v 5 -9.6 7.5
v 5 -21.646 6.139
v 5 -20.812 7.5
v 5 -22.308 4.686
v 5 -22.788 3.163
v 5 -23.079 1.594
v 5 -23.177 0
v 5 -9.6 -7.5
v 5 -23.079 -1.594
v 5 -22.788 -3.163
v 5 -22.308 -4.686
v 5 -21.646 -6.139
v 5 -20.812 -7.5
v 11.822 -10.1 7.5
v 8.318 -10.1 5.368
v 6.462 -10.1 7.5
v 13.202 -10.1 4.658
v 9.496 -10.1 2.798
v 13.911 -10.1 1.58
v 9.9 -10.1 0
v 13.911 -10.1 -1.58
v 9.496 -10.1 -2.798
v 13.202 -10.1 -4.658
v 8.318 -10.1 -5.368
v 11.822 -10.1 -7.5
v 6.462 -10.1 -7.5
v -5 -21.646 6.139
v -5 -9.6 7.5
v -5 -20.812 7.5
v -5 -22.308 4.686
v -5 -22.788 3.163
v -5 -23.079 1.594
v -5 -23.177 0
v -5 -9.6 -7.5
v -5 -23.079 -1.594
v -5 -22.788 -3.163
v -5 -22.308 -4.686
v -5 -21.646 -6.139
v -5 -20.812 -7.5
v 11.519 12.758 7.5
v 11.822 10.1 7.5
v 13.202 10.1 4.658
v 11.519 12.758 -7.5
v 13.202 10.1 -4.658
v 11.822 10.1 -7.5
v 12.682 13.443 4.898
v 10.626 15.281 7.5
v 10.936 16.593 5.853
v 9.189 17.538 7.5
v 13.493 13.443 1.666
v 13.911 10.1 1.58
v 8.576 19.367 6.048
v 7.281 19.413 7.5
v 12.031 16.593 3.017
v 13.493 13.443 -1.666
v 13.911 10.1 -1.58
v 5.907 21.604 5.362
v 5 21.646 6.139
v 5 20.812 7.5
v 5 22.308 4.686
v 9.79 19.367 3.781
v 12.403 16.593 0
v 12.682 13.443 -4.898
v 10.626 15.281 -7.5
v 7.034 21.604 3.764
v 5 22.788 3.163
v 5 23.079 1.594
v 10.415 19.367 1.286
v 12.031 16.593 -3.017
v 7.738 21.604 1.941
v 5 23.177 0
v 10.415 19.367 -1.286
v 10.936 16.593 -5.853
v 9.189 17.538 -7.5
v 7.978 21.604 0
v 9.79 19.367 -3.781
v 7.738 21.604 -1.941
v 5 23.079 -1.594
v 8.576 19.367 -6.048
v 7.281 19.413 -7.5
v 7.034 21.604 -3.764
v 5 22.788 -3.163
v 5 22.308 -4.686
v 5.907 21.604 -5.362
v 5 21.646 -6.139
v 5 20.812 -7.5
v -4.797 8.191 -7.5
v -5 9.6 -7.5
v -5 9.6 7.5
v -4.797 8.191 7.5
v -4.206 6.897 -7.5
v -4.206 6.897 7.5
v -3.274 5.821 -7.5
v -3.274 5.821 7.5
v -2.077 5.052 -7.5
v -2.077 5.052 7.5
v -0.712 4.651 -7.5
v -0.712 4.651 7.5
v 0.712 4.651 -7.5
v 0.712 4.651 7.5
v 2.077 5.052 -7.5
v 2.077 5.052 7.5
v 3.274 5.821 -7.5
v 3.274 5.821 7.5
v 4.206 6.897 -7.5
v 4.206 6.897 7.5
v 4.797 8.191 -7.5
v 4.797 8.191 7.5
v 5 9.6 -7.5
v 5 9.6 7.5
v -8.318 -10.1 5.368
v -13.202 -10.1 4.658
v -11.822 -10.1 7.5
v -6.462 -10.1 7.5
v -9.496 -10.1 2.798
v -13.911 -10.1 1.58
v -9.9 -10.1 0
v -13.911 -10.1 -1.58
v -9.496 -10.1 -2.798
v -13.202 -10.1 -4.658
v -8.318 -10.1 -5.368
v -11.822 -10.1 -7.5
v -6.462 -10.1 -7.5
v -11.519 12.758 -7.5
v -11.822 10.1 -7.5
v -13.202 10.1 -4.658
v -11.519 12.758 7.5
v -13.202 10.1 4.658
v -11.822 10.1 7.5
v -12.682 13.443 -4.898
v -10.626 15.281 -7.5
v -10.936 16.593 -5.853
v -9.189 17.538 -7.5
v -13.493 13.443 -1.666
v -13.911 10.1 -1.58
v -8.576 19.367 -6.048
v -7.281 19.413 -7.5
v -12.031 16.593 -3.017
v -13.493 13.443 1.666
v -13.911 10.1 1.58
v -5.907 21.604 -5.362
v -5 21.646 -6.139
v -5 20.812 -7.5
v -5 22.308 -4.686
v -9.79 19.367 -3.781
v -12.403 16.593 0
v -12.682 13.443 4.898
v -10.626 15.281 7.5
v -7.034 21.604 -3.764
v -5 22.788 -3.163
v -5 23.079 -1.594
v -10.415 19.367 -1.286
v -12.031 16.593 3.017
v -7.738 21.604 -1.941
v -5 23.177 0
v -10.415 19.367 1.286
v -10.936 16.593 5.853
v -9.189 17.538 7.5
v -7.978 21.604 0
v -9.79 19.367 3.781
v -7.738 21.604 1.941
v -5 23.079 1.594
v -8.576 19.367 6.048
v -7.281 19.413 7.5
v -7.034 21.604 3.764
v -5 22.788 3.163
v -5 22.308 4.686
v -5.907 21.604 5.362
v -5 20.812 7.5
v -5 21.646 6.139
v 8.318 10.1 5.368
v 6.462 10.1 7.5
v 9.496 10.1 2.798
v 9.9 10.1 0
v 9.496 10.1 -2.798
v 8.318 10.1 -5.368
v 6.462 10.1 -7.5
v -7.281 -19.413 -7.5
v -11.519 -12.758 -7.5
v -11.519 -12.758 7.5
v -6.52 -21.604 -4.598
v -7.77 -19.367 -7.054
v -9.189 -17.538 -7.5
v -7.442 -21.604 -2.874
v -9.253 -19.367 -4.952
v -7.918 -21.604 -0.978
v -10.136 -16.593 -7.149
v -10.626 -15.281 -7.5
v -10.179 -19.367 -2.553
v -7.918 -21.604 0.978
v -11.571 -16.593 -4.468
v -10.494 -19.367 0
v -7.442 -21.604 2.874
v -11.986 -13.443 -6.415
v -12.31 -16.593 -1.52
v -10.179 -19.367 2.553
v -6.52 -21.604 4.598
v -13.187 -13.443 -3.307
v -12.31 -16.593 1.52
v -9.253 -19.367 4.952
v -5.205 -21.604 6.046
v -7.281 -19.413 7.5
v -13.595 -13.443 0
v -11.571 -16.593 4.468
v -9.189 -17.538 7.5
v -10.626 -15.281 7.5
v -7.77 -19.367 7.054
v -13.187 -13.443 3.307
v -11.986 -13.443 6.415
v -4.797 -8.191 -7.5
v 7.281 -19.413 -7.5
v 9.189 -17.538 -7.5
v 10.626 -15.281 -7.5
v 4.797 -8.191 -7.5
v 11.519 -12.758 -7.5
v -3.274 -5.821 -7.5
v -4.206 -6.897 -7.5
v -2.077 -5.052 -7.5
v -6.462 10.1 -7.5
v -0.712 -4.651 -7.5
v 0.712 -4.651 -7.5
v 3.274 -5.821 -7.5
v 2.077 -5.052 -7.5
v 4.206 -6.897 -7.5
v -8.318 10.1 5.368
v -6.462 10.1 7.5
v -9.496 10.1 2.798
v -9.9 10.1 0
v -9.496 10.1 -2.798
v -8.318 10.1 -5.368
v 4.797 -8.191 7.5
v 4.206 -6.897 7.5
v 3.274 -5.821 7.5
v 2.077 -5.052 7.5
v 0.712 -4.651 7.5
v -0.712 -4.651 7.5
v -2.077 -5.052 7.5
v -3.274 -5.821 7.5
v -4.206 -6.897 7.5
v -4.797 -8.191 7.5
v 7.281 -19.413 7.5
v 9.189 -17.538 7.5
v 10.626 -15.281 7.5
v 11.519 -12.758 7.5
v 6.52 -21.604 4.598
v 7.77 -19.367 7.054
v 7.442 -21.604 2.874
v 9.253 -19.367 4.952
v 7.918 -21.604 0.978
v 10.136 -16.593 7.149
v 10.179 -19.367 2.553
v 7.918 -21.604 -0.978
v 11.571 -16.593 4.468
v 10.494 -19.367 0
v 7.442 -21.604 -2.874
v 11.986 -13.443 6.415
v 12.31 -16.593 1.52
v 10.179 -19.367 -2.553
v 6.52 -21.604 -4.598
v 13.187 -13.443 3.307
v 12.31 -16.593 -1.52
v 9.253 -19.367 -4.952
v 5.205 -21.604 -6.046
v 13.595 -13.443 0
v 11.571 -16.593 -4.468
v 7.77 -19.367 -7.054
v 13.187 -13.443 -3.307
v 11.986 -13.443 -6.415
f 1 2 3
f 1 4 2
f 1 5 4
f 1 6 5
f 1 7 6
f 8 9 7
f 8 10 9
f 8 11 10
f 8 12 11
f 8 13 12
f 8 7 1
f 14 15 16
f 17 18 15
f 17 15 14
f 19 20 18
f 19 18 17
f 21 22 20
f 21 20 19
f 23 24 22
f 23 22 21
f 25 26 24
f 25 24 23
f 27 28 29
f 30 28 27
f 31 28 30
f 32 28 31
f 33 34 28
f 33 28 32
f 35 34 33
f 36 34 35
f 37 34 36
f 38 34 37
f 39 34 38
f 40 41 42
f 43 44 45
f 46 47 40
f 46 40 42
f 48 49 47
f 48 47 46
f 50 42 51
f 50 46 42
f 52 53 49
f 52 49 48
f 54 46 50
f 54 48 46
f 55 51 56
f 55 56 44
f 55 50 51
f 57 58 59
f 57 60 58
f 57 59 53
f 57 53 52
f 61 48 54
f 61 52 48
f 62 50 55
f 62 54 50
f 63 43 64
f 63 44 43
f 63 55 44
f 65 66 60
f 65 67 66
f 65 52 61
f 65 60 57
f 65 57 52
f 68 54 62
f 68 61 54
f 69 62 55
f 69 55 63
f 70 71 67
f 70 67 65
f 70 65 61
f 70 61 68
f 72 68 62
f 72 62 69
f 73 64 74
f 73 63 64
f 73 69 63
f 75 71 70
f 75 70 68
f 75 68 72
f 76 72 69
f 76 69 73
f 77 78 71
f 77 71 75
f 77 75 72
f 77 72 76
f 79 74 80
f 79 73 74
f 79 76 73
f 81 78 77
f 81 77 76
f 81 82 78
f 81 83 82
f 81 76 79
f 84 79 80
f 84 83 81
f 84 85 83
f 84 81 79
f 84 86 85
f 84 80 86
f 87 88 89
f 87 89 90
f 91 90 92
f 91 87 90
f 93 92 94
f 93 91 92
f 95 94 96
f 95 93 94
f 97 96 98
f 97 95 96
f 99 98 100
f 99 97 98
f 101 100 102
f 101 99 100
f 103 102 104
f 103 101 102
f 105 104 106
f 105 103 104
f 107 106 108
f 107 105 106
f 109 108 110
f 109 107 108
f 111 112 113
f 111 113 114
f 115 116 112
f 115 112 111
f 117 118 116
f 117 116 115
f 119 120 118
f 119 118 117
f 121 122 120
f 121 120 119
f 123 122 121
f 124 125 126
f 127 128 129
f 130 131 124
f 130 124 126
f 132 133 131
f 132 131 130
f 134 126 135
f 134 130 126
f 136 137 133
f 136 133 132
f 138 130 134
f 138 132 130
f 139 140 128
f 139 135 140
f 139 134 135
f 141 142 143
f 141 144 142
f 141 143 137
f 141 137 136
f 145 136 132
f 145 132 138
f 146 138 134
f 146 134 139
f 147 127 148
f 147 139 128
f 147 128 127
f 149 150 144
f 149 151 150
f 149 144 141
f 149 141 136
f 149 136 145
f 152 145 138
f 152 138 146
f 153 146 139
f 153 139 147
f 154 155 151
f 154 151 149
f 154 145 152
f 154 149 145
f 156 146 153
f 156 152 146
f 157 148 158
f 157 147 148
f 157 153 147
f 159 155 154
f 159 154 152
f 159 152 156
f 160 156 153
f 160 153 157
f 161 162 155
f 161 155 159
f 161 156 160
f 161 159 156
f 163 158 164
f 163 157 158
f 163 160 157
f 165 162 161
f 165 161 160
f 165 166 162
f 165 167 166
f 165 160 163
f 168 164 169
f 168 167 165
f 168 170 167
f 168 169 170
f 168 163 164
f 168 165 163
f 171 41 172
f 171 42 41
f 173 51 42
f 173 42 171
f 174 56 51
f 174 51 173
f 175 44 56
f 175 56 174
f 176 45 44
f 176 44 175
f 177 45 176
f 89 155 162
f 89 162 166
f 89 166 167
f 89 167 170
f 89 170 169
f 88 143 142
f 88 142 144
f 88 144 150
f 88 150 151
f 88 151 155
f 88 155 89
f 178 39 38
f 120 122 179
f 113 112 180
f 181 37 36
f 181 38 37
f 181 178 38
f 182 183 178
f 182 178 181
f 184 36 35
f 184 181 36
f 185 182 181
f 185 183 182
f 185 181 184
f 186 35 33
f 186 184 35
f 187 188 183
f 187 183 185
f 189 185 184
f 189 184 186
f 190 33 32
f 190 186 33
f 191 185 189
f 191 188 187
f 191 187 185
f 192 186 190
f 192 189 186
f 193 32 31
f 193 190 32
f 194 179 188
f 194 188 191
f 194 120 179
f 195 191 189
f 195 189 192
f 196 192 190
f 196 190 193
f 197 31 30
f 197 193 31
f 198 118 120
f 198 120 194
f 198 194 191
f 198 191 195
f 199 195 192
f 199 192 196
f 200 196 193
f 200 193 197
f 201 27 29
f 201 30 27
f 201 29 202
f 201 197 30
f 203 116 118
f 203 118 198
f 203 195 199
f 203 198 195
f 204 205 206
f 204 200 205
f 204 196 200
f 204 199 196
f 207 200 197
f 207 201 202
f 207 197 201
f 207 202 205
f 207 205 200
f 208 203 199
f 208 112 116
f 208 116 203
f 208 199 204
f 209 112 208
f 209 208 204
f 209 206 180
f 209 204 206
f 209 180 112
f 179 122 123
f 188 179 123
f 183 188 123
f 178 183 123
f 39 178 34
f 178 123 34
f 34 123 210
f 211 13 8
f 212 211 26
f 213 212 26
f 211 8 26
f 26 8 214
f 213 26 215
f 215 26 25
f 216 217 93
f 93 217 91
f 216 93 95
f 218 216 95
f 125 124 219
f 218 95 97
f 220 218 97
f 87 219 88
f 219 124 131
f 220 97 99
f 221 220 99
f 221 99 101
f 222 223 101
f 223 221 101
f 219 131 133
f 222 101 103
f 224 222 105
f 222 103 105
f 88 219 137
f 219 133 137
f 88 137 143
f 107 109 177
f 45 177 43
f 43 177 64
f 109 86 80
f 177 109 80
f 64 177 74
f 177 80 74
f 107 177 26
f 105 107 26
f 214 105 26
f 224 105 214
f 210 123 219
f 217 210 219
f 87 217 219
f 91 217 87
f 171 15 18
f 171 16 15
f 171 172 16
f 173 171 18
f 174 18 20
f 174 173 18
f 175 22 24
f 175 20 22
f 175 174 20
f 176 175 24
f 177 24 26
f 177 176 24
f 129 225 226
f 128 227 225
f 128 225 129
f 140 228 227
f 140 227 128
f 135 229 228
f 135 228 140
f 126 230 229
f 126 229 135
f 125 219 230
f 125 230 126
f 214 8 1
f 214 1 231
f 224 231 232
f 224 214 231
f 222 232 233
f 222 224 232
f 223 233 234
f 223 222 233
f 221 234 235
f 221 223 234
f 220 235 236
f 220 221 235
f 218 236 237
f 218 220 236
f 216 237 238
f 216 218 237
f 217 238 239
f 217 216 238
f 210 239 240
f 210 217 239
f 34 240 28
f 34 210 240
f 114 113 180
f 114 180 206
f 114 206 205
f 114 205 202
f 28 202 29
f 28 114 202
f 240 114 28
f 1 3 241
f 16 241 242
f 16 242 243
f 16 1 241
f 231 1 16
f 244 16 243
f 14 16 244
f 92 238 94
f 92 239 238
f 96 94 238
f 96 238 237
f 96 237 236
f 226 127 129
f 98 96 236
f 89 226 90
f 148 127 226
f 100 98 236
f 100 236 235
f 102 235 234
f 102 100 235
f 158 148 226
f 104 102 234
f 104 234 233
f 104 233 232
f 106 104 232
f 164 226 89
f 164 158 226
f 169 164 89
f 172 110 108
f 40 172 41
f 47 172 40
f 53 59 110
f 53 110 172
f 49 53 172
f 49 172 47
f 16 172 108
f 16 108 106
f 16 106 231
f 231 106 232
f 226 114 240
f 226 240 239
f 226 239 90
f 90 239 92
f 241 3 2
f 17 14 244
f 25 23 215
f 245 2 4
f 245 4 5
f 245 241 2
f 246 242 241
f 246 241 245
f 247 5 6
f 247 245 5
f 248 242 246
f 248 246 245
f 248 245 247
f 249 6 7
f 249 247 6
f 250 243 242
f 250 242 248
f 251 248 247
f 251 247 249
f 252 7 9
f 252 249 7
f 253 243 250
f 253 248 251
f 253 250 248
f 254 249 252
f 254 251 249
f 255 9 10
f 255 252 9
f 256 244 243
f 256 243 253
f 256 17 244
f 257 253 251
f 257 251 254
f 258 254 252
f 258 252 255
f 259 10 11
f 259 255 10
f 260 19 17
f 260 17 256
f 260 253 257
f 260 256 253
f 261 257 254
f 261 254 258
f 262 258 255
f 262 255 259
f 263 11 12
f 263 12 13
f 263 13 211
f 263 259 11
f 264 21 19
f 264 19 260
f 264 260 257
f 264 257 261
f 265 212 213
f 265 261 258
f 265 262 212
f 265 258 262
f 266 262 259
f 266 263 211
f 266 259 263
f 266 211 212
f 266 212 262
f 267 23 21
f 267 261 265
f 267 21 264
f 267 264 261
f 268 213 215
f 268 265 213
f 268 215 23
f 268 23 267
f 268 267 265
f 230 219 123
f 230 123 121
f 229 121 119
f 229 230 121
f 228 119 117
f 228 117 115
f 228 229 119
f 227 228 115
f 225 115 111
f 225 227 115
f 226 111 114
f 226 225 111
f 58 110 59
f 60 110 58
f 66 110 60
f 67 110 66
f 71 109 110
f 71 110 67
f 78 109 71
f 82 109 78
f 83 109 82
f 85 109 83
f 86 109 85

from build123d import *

# Parameters (mm, degrees)
ESBO_O2_OUTSIDE_W          = 42.476
ESBO_O2_OUTSIDE_H          = 42.476
ESBO_O2_OUTSIDE_W_2        = 28
ESBO_O2_OUTSIDE_H_2        = 15
CORTE_EXTRUS_O1_DEPTH      = 25.1
CORTE_EXTRUS_O1_DEPTH_BACK = 25.1
CORTE_EXTRUS_O2_DEPTH      = 16


with BuildPart() as part:
    # Esboço1 → Revolução1 (revolve)
    with BuildSketch(Plane.XY):
        with BuildLine():
            Line((0, 24.1), (0, -24.1))
            ThreePointArc((0, -24.1), (9.899494937, -19.999494937), (14, -10.1))
            Line((14, -10.1), (9.9, -10.1))
            Line((9.9, -10.1), (9.9, 10.1))
            Line((9.9, 10.1), (14, 10.1))
            ThreePointArc((14, 10.1), (9.899494937, 19.999494937), (0, 24.1))
        make_face()
    revolve(axis=Axis((0, -24.1, 0), (0, 1, 0)))

    # Esboço2 outside → Corte-extrusão1 (cut, two sides)
    with BuildSketch(Plane(origin=(0, 0, 0), x_dir=(1, 0, 0), z_dir=(0, 1, 0))) as corte_extrus_o1_sk:
        Rectangle(ESBO_O2_OUTSIDE_W, ESBO_O2_OUTSIDE_H)
        Rectangle(ESBO_O2_OUTSIDE_W_2, ESBO_O2_OUTSIDE_H_2, mode=Mode.SUBTRACT)
    extrude(amount=CORTE_EXTRUS_O1_DEPTH, mode=Mode.SUBTRACT)
    extrude(corte_extrus_o1_sk.sketch, amount=-CORTE_EXTRUS_O1_DEPTH_BACK, mode=Mode.SUBTRACT)

    # Esboço3 → Corte-extrusão2 (cut, through all)
    with BuildSketch(Plane(origin=(0, 0, -7.5), x_dir=(-1, 0, 0), z_dir=(0, 0, -1))):
        with BuildLine():
            Line((5, 24.1), (5, 9.6))
            ThreePointArc((5, 9.6), (0, 4.6), (-5, 9.6))
            Line((-5, 9.6), (-5, 24.1))
            ThreePointArc((-5, 24.1), (0, 29.1), (5, 24.1))
        make_face()
        with BuildLine():
            Line((-5, -24.1), (-5, -9.6))
            ThreePointArc((-5, -9.6), (0, -4.6), (5, -9.6))
            Line((5, -9.6), (5, -24.1))
            ThreePointArc((5, -24.1), (0, -29.1), (-5, -24.1))
        make_face()
    extrude(amount=-CORTE_EXTRUS_O2_DEPTH, mode=Mode.SUBTRACT)


solid = part.part
